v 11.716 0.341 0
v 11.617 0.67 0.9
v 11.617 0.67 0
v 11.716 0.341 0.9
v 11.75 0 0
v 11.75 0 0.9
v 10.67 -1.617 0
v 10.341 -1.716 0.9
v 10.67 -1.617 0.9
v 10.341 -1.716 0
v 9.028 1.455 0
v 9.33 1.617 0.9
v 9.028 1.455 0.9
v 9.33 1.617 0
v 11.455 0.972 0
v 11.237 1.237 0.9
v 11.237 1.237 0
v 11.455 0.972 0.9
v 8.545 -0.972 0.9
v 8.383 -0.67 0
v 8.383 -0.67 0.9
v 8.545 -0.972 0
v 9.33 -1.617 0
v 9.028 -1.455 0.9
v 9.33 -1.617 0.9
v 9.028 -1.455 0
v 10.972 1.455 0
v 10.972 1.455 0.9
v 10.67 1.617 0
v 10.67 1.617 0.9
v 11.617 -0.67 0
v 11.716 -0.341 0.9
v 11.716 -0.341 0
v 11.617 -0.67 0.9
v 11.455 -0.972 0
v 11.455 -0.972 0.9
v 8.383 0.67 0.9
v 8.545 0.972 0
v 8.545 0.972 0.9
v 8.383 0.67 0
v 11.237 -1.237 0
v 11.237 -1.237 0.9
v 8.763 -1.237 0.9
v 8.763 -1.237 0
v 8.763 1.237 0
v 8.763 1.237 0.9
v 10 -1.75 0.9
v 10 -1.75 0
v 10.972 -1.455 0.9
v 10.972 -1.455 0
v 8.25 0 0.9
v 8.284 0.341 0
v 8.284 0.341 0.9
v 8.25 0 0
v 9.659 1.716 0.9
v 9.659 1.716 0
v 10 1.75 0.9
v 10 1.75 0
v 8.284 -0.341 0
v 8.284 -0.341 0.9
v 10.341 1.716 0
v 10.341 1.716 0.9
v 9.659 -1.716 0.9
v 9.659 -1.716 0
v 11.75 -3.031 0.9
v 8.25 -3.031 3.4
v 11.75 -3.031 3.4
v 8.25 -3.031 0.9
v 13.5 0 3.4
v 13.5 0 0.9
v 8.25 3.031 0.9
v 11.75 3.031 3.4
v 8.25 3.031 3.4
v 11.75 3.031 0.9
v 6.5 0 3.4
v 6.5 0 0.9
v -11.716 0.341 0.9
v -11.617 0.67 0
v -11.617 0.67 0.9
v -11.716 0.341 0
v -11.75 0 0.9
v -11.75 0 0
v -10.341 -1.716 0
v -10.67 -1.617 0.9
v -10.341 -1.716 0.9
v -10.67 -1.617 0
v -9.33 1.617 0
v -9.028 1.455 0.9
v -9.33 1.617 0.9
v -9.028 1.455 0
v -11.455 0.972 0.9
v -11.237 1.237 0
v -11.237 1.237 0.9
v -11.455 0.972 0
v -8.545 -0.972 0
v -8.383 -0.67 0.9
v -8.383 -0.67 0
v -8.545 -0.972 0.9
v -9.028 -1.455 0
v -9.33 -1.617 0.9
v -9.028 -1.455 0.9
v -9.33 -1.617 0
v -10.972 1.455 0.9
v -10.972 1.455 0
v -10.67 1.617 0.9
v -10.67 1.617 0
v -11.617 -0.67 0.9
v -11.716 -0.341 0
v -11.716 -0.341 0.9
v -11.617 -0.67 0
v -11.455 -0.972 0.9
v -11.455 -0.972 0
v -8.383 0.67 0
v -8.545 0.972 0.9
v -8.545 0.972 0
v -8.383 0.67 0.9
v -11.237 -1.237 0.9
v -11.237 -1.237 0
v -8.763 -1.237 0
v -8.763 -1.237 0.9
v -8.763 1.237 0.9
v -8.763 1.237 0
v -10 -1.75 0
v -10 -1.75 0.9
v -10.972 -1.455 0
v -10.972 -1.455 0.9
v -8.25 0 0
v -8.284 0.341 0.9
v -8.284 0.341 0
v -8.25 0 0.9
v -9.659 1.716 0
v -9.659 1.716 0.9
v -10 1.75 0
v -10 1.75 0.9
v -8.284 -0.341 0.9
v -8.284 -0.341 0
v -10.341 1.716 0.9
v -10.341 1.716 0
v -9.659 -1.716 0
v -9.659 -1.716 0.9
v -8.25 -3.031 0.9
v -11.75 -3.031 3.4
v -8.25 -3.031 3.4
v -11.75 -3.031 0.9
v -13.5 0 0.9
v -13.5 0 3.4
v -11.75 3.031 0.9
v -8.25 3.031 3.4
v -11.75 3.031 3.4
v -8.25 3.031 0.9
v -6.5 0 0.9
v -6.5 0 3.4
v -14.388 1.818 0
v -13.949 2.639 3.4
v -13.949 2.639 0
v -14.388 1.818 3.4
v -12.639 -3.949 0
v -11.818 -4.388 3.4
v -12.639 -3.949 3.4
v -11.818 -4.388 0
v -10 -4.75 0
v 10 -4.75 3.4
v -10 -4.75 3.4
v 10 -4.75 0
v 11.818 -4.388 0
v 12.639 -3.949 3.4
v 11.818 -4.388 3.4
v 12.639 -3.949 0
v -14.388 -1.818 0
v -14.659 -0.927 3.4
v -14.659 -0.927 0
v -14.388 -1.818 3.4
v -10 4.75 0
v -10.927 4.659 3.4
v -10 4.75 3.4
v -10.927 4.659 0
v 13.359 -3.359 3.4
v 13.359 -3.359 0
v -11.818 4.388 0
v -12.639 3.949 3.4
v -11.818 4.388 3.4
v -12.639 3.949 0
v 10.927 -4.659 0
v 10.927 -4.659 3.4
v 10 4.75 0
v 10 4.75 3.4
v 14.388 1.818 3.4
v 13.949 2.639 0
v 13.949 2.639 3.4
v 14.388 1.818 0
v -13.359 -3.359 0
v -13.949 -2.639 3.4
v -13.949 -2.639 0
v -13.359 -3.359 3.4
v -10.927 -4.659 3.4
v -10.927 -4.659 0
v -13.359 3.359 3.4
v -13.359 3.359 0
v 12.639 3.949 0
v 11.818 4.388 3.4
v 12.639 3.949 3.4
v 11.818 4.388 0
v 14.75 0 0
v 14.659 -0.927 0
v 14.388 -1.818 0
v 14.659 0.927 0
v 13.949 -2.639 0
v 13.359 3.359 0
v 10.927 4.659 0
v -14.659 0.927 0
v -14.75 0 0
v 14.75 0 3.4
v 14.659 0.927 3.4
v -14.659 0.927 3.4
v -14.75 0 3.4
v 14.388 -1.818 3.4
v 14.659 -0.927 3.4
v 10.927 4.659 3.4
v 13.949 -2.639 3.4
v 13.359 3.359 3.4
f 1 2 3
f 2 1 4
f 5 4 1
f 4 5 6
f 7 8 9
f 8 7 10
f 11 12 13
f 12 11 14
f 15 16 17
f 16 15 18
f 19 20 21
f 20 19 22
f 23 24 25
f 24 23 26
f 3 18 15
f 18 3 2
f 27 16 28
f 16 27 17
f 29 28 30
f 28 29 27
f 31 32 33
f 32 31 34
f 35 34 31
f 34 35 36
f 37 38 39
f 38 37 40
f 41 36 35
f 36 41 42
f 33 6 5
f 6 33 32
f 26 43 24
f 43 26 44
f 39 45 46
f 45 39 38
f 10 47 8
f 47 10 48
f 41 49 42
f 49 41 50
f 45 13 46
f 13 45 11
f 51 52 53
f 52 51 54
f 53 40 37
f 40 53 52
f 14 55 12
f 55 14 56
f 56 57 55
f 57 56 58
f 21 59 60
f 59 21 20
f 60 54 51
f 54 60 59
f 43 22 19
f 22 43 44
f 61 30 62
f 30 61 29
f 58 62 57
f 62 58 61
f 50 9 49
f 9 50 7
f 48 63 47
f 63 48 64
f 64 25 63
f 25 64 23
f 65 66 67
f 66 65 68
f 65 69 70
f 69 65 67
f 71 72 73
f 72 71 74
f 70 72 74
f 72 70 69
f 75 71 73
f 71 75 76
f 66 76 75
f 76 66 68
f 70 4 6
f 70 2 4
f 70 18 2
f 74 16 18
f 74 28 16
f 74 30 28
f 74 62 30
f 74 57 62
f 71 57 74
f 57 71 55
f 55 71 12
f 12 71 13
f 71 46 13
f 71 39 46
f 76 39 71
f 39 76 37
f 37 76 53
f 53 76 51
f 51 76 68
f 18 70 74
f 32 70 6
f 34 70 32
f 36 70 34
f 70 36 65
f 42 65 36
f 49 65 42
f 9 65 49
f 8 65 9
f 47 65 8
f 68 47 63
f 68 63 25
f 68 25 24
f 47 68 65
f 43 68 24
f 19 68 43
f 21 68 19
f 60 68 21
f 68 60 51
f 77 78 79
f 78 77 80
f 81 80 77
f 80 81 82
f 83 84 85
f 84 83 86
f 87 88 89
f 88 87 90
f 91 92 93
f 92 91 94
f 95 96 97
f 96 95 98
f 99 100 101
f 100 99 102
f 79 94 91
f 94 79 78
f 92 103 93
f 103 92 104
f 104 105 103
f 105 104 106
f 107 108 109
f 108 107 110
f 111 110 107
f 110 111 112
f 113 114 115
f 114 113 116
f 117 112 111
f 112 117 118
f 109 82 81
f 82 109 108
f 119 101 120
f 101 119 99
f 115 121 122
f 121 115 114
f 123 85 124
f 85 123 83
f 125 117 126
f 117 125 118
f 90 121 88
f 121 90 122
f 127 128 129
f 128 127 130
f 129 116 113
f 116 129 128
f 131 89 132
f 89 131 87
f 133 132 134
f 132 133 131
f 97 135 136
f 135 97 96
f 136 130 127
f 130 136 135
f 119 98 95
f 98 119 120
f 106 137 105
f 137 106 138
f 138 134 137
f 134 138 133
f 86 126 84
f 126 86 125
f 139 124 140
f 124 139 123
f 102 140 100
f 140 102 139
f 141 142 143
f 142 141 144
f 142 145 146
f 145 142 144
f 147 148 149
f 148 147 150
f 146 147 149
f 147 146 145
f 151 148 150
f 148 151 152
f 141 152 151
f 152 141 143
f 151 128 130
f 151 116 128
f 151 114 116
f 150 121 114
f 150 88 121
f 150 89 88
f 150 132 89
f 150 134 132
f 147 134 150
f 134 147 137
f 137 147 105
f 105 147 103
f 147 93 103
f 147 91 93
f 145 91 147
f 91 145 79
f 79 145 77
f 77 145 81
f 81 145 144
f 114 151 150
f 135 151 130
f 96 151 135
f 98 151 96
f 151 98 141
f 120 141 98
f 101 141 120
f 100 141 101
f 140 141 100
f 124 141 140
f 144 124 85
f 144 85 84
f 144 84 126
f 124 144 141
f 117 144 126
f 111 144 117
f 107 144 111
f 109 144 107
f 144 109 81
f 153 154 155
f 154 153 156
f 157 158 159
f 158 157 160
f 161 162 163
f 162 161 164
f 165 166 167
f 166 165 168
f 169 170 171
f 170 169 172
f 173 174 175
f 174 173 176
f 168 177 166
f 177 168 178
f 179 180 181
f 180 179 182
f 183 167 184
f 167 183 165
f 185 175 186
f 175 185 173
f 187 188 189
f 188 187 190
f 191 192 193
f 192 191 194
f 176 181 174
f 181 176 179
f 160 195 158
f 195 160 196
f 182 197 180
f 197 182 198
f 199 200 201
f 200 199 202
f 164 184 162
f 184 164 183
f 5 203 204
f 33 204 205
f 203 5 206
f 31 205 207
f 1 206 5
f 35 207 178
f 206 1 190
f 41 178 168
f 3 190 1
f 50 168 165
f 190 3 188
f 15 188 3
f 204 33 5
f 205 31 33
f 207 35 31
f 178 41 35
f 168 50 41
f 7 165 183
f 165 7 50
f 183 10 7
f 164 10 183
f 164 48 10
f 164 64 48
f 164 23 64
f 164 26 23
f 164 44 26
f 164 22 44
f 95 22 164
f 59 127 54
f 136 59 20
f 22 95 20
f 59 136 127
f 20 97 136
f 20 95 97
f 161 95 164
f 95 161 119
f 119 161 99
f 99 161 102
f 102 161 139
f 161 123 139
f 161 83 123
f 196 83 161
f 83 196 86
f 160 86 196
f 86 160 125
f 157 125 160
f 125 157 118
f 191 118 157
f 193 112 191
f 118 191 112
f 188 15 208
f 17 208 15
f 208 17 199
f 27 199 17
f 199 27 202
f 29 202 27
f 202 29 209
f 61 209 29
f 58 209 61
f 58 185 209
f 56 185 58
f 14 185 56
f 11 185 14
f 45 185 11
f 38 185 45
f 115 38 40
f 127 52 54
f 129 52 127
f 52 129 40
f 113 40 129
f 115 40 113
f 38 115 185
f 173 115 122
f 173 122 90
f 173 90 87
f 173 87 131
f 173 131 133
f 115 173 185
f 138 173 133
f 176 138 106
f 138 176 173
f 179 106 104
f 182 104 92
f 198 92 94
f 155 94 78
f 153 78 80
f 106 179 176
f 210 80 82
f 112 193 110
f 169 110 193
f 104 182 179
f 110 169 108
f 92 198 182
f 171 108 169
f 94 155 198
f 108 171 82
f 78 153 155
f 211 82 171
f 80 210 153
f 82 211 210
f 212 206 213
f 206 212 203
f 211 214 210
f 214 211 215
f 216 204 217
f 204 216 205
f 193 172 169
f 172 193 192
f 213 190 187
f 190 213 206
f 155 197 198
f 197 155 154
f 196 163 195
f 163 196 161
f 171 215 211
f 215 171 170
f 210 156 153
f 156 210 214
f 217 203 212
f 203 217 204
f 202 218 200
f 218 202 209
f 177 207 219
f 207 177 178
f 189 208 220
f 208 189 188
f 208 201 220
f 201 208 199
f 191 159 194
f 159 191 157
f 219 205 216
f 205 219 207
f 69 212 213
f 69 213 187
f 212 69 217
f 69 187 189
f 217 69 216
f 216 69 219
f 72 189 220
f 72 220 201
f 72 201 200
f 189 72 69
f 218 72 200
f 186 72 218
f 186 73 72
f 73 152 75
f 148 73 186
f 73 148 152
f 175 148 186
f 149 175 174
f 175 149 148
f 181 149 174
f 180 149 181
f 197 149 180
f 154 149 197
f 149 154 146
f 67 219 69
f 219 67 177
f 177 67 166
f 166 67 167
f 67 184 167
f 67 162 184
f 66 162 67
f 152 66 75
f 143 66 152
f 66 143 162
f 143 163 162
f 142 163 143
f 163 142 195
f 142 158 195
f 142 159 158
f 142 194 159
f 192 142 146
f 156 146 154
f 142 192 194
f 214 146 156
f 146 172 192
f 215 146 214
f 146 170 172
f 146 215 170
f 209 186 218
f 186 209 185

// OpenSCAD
slop = .25;

m3_dia = 3;
m3_rad = m3_dia/2+slop;

m3_cap_dia = 5.7;
m3_cap_rad = m3_cap_dia/2+slop;
m3_cap_thick = 1.65+slop/2;
m3_cap_hex_rad = (2/cos(30))/2;

m3_nut_dia = 6.5;
m3_nut_rad = m3_nut_dia/2+slop;
m3_nut_thick = 2.4;


lm8uu_dia = 15;
lm8uu_rad = lm8uu_dia/2+slop;
lm8uu_len = 24+slop;

lm8uu_inset = 2;  //inset into frame

wall = 3;
width = 12;
hole_sep = 20;

$fn=32;

bearing_clamp();

!nut_trap();

module bearing_clamp(){
	difference(){
		hull(){
			rotate([-90,0,0]) translate([0,lm8uu_inset-lm8uu_rad,0]) cylinder(r=lm8uu_rad+wall, h=width, center=true);

			for(i=[0,1]) mirror([i,0,0]) translate([hole_sep/2,0,0]) cylinder(r=m3_rad+wall, h=wall);
		}

		//bearing
		rotate([-90,0,0]) hull(){
			translate([0,lm8uu_inset-lm8uu_rad,0]) cap_cylinder(r=lm8uu_rad, h=lm8uu_len, center=true);
			cap_cylinder(r=lm8uu_rad, h=lm8uu_len, center=true);
		}

		//screwholes
		for(i=[0,1]) mirror([i,0,0]) translate([hole_sep/2,0,-.1]) {
			cylinder(r=m3_rad-.05, h=wall+.1);
			translate([0,0,wall/2]) cylinder(r=m3_cap_rad, h=lm8uu_dia);
		}

		translate([0,0,-50]) cube([100,100,100], center=true); 
	}
}

module nut_trap(){
	difference(){
		hull(){
			for(i=[0,1]) mirror([i,0,0]) translate([hole_sep/2,0,0]) cylinder(r=m3_rad+wall, h=1+m3_nut_thick);
		}

		//screwholes
		for(i=[0,1]) mirror([i,0,0]) translate([hole_sep/2,0,-.1]) {
			cylinder(r=m3_rad, h=wall+.1);
			translate([0,0,1]) cylinder(r=m3_nut_rad, h=lm8uu_dia, $fn=6);
		}

		translate([0,0,-50]) cube([100,100,100], center=true); 
	}
}

module cap_screw(len = 10){
	color([.25,.25,.25])
	difference(){
		union(){
			translate([0,0,-len/2]) rotate([0,0,-90]) cap_cylinder(r=screw_rad, h=len, center=true);
			translate([0,0,len/2-.1]) difference(){
				scale([1,1,.75]) sphere(r=cap_rad);
				translate([0,0,-cap_dia/2]) cube([cap_dia+1, cap_dia+1, cap_dia],center=true);
				translate([0,0,cap_dia/2+.1+cap_thick]) cube([cap_dia+1, cap_dia+1, cap_dia],center=true);
			}
		}
		
		translate([0,0,len/2+slop]) cylinder(r=cap_hex_rad, h=cap_thick, $fn=6);
	}
}

module cap_cylinder(r=1, h=1, center=false){
	cylinder(r=r, h=h, center=center);
	intersection(){
		rotate([0,0,22.5]) cylinder(r=r/cos(180/8), h=h, $fn=8, center=center);
		translate([0,-r/cos(180/4),0]) rotate([0,0,0]) cylinder(r=r/cos(180/4), h=h, $fn=4, center=center);
	}
}
